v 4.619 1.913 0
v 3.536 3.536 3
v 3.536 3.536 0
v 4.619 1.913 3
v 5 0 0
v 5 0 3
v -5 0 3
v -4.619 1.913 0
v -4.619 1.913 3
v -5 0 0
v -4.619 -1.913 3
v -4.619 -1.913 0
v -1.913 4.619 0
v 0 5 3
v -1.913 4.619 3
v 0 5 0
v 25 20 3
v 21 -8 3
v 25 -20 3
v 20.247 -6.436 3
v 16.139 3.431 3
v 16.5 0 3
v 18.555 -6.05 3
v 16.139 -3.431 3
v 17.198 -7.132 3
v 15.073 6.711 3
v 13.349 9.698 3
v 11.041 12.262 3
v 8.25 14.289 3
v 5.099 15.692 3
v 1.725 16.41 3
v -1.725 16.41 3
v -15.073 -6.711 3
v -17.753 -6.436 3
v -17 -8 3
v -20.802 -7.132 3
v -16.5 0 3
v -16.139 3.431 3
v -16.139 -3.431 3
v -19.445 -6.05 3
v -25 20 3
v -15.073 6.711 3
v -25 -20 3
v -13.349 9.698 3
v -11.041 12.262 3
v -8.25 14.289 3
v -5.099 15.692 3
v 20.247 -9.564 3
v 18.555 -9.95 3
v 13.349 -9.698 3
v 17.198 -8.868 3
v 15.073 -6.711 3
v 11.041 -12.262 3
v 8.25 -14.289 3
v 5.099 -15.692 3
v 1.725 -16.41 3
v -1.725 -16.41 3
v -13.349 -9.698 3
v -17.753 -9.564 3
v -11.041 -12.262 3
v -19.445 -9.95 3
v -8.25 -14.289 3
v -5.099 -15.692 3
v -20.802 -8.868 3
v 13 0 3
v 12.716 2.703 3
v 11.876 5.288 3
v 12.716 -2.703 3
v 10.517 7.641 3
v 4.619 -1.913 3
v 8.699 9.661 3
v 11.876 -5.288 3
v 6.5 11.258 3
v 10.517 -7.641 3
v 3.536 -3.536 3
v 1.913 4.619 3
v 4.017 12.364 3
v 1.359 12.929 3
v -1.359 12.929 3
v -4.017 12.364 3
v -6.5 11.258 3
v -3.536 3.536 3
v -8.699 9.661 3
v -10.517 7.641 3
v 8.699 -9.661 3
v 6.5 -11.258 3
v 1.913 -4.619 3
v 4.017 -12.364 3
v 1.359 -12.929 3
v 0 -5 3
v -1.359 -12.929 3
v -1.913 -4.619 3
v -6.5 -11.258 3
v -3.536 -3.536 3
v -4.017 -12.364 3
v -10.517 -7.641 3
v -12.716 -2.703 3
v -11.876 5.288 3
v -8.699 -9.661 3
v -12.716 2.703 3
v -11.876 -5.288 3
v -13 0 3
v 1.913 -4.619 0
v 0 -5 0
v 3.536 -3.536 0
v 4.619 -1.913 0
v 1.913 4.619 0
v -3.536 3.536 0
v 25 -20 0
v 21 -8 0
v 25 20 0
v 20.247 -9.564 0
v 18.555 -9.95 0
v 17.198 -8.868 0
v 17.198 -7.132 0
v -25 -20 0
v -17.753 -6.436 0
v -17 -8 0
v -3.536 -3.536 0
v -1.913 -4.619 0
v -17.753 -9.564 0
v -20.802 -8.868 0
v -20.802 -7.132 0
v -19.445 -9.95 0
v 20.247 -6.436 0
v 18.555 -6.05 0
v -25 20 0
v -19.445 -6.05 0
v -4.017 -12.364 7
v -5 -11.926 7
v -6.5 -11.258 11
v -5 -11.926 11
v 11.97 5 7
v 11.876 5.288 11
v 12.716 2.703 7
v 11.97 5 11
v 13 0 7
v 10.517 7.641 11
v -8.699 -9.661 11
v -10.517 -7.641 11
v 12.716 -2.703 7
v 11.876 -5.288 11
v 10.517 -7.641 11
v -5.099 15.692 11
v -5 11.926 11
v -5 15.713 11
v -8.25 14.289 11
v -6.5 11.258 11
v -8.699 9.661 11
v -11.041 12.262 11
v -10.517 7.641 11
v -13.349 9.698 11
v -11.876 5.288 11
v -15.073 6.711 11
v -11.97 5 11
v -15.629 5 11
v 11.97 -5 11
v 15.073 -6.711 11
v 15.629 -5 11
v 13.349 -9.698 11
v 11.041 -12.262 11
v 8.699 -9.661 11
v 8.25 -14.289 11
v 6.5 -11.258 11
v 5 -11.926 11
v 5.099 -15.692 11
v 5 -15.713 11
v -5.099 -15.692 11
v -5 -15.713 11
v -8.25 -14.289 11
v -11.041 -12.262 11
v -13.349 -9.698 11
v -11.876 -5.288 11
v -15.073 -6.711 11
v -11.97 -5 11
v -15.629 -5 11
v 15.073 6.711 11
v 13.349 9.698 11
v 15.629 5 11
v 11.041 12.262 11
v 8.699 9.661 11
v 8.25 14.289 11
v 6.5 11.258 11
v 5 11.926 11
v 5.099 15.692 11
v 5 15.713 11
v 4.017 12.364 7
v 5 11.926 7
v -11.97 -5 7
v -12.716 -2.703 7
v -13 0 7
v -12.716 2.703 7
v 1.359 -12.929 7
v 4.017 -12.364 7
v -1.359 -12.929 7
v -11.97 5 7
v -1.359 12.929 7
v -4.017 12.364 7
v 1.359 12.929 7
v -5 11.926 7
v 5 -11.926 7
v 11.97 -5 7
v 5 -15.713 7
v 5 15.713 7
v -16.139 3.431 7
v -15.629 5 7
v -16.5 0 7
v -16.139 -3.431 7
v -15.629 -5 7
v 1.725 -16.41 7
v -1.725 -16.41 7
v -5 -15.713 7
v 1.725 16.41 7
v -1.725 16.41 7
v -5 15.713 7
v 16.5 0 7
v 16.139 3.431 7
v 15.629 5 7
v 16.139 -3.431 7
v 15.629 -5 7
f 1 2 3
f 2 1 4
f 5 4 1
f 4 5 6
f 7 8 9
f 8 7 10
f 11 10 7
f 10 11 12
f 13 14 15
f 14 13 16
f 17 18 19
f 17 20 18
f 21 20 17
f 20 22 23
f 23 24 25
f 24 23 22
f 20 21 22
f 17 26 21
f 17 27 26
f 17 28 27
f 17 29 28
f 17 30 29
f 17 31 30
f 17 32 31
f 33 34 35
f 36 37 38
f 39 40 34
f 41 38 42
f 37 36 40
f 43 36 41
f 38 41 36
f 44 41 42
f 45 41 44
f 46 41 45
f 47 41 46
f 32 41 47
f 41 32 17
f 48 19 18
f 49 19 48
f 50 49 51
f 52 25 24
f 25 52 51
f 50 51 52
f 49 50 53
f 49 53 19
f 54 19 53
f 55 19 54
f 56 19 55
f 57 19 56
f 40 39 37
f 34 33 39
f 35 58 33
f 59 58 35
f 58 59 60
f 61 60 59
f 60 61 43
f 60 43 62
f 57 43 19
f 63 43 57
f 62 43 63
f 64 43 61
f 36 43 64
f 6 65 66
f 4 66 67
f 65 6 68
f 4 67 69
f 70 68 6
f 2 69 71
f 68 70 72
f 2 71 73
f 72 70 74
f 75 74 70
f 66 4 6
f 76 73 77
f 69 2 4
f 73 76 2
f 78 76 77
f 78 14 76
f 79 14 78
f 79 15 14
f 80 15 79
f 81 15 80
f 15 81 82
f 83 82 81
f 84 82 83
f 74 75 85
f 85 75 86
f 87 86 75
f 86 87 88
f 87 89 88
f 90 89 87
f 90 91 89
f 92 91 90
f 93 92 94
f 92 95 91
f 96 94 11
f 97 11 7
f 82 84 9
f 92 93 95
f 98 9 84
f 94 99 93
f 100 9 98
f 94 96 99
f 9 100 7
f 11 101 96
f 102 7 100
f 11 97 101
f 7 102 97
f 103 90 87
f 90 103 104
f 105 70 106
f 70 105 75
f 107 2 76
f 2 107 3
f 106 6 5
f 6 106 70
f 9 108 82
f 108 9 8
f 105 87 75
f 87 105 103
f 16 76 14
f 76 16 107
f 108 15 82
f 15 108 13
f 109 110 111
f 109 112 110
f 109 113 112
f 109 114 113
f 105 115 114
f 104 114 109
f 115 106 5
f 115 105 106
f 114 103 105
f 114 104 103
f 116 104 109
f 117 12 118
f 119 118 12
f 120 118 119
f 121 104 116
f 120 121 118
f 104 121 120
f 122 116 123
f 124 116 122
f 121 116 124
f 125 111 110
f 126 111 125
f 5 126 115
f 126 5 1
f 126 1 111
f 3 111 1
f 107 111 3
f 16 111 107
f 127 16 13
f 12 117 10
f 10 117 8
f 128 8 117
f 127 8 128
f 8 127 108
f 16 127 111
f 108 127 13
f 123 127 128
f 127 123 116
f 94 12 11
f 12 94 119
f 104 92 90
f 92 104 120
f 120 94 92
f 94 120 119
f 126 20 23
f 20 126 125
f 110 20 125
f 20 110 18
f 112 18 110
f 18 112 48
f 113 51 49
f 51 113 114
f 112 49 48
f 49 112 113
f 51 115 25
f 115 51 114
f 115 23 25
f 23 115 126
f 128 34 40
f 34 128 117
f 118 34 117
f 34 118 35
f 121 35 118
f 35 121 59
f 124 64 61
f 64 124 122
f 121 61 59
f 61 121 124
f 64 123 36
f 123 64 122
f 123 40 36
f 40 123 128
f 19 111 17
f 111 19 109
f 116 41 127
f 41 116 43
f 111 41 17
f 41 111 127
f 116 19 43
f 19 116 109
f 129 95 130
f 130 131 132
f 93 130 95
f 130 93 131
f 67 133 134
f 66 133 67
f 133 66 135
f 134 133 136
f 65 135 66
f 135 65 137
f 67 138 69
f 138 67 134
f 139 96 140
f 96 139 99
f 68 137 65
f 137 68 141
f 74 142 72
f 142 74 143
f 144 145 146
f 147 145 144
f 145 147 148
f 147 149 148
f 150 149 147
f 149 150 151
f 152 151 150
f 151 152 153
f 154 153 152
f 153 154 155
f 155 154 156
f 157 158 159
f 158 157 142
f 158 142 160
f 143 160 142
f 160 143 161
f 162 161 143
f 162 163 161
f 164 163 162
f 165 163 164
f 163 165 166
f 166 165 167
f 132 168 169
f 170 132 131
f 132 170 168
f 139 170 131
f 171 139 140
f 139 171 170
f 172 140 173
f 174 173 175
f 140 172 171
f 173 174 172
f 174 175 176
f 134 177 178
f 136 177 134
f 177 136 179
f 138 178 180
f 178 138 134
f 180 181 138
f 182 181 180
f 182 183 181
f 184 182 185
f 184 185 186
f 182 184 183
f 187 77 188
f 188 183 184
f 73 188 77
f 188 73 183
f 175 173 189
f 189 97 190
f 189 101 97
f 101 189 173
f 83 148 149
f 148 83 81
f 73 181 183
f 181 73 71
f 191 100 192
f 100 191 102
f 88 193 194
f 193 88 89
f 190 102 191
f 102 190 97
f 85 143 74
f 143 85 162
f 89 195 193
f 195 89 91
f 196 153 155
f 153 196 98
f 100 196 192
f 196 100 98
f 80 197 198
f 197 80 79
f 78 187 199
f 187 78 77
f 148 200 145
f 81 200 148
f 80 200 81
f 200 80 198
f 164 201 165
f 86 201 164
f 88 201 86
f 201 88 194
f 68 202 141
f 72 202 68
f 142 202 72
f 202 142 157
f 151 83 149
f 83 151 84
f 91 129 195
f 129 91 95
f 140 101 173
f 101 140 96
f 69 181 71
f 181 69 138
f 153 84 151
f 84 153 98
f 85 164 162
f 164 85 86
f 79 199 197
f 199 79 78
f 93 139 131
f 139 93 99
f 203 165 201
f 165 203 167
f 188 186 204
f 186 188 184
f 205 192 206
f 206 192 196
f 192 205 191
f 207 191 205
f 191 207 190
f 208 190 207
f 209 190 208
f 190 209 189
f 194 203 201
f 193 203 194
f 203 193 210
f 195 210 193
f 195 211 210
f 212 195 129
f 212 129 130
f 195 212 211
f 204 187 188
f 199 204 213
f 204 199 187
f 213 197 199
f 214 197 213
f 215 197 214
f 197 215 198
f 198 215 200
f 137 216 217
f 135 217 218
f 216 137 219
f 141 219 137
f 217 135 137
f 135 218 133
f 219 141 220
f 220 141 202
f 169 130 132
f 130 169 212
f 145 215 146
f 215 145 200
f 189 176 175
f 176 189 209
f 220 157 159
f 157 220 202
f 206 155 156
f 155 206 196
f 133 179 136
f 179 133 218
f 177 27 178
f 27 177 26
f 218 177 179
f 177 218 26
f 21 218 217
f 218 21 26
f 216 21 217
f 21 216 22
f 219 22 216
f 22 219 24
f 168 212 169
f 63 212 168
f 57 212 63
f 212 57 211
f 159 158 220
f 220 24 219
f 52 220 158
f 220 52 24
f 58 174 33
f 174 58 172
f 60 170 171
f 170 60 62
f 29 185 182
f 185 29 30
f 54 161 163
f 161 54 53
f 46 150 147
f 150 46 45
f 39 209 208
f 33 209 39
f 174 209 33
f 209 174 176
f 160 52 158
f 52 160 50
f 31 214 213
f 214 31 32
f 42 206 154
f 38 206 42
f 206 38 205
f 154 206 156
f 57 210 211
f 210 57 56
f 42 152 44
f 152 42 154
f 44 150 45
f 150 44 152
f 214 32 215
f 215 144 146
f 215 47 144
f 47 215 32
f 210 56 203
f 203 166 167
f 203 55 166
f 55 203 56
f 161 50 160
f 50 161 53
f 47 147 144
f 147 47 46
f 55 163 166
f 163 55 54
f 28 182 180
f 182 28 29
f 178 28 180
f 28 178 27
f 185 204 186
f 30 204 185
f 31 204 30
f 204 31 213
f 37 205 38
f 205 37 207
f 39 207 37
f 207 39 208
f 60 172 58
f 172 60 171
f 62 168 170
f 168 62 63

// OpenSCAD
//Turbidostat
//Stirrer
//Magnet Holder
//by: Agostino Guarino agostinoguarino@gmail.com


//Dimensions of the Test Tube, in mm
ttube_ext_diam=25;

//Structure Dimensions
ext_tolerance=1; //gap between the tube and the holder
support_ext_diam=ttube_ext_diam+8;
base_side1=50;
base_side2=40;
base_height=3;
central_hole_radius=5;
mount_hole_radius=2;

union(){
    difference(){
        translate([0,0,base_height/2])cube([base_side1,         base_side2, base_height],true);
        union(){
            translate([0,0,base_height/2])cylinder(base_height, central_hole_radius, central_hole_radius,true);
            translate([19,-8,base_height/2])cylinder(base_height, mount_hole_radius, mount_hole_radius,true);
            translate([-19,-8
    ,base_height/2])cylinder(base_height, mount_hole_radius, mount_hole_radius,true);
            }
    }
    difference(){
        translate([0,0,base_height/2+4])cylinder(base_height+8, support_ext_diam/2, support_ext_diam/2,true);
        union(){
            translate([0,0,base_height/2+4])cylinder(base_height+8, (ttube_ext_diam+ext_tolerance)/2, (ttube_ext_diam+ext_tolerance)/2,true);
            translate([0,0,base_height/2+7.5])cube([10,support_ext_diam,4],true);
            rotate([0,0,90])translate([0,0,base_height/2+7.5])cube([10,support_ext_diam,4],true);
            }
        }
}
